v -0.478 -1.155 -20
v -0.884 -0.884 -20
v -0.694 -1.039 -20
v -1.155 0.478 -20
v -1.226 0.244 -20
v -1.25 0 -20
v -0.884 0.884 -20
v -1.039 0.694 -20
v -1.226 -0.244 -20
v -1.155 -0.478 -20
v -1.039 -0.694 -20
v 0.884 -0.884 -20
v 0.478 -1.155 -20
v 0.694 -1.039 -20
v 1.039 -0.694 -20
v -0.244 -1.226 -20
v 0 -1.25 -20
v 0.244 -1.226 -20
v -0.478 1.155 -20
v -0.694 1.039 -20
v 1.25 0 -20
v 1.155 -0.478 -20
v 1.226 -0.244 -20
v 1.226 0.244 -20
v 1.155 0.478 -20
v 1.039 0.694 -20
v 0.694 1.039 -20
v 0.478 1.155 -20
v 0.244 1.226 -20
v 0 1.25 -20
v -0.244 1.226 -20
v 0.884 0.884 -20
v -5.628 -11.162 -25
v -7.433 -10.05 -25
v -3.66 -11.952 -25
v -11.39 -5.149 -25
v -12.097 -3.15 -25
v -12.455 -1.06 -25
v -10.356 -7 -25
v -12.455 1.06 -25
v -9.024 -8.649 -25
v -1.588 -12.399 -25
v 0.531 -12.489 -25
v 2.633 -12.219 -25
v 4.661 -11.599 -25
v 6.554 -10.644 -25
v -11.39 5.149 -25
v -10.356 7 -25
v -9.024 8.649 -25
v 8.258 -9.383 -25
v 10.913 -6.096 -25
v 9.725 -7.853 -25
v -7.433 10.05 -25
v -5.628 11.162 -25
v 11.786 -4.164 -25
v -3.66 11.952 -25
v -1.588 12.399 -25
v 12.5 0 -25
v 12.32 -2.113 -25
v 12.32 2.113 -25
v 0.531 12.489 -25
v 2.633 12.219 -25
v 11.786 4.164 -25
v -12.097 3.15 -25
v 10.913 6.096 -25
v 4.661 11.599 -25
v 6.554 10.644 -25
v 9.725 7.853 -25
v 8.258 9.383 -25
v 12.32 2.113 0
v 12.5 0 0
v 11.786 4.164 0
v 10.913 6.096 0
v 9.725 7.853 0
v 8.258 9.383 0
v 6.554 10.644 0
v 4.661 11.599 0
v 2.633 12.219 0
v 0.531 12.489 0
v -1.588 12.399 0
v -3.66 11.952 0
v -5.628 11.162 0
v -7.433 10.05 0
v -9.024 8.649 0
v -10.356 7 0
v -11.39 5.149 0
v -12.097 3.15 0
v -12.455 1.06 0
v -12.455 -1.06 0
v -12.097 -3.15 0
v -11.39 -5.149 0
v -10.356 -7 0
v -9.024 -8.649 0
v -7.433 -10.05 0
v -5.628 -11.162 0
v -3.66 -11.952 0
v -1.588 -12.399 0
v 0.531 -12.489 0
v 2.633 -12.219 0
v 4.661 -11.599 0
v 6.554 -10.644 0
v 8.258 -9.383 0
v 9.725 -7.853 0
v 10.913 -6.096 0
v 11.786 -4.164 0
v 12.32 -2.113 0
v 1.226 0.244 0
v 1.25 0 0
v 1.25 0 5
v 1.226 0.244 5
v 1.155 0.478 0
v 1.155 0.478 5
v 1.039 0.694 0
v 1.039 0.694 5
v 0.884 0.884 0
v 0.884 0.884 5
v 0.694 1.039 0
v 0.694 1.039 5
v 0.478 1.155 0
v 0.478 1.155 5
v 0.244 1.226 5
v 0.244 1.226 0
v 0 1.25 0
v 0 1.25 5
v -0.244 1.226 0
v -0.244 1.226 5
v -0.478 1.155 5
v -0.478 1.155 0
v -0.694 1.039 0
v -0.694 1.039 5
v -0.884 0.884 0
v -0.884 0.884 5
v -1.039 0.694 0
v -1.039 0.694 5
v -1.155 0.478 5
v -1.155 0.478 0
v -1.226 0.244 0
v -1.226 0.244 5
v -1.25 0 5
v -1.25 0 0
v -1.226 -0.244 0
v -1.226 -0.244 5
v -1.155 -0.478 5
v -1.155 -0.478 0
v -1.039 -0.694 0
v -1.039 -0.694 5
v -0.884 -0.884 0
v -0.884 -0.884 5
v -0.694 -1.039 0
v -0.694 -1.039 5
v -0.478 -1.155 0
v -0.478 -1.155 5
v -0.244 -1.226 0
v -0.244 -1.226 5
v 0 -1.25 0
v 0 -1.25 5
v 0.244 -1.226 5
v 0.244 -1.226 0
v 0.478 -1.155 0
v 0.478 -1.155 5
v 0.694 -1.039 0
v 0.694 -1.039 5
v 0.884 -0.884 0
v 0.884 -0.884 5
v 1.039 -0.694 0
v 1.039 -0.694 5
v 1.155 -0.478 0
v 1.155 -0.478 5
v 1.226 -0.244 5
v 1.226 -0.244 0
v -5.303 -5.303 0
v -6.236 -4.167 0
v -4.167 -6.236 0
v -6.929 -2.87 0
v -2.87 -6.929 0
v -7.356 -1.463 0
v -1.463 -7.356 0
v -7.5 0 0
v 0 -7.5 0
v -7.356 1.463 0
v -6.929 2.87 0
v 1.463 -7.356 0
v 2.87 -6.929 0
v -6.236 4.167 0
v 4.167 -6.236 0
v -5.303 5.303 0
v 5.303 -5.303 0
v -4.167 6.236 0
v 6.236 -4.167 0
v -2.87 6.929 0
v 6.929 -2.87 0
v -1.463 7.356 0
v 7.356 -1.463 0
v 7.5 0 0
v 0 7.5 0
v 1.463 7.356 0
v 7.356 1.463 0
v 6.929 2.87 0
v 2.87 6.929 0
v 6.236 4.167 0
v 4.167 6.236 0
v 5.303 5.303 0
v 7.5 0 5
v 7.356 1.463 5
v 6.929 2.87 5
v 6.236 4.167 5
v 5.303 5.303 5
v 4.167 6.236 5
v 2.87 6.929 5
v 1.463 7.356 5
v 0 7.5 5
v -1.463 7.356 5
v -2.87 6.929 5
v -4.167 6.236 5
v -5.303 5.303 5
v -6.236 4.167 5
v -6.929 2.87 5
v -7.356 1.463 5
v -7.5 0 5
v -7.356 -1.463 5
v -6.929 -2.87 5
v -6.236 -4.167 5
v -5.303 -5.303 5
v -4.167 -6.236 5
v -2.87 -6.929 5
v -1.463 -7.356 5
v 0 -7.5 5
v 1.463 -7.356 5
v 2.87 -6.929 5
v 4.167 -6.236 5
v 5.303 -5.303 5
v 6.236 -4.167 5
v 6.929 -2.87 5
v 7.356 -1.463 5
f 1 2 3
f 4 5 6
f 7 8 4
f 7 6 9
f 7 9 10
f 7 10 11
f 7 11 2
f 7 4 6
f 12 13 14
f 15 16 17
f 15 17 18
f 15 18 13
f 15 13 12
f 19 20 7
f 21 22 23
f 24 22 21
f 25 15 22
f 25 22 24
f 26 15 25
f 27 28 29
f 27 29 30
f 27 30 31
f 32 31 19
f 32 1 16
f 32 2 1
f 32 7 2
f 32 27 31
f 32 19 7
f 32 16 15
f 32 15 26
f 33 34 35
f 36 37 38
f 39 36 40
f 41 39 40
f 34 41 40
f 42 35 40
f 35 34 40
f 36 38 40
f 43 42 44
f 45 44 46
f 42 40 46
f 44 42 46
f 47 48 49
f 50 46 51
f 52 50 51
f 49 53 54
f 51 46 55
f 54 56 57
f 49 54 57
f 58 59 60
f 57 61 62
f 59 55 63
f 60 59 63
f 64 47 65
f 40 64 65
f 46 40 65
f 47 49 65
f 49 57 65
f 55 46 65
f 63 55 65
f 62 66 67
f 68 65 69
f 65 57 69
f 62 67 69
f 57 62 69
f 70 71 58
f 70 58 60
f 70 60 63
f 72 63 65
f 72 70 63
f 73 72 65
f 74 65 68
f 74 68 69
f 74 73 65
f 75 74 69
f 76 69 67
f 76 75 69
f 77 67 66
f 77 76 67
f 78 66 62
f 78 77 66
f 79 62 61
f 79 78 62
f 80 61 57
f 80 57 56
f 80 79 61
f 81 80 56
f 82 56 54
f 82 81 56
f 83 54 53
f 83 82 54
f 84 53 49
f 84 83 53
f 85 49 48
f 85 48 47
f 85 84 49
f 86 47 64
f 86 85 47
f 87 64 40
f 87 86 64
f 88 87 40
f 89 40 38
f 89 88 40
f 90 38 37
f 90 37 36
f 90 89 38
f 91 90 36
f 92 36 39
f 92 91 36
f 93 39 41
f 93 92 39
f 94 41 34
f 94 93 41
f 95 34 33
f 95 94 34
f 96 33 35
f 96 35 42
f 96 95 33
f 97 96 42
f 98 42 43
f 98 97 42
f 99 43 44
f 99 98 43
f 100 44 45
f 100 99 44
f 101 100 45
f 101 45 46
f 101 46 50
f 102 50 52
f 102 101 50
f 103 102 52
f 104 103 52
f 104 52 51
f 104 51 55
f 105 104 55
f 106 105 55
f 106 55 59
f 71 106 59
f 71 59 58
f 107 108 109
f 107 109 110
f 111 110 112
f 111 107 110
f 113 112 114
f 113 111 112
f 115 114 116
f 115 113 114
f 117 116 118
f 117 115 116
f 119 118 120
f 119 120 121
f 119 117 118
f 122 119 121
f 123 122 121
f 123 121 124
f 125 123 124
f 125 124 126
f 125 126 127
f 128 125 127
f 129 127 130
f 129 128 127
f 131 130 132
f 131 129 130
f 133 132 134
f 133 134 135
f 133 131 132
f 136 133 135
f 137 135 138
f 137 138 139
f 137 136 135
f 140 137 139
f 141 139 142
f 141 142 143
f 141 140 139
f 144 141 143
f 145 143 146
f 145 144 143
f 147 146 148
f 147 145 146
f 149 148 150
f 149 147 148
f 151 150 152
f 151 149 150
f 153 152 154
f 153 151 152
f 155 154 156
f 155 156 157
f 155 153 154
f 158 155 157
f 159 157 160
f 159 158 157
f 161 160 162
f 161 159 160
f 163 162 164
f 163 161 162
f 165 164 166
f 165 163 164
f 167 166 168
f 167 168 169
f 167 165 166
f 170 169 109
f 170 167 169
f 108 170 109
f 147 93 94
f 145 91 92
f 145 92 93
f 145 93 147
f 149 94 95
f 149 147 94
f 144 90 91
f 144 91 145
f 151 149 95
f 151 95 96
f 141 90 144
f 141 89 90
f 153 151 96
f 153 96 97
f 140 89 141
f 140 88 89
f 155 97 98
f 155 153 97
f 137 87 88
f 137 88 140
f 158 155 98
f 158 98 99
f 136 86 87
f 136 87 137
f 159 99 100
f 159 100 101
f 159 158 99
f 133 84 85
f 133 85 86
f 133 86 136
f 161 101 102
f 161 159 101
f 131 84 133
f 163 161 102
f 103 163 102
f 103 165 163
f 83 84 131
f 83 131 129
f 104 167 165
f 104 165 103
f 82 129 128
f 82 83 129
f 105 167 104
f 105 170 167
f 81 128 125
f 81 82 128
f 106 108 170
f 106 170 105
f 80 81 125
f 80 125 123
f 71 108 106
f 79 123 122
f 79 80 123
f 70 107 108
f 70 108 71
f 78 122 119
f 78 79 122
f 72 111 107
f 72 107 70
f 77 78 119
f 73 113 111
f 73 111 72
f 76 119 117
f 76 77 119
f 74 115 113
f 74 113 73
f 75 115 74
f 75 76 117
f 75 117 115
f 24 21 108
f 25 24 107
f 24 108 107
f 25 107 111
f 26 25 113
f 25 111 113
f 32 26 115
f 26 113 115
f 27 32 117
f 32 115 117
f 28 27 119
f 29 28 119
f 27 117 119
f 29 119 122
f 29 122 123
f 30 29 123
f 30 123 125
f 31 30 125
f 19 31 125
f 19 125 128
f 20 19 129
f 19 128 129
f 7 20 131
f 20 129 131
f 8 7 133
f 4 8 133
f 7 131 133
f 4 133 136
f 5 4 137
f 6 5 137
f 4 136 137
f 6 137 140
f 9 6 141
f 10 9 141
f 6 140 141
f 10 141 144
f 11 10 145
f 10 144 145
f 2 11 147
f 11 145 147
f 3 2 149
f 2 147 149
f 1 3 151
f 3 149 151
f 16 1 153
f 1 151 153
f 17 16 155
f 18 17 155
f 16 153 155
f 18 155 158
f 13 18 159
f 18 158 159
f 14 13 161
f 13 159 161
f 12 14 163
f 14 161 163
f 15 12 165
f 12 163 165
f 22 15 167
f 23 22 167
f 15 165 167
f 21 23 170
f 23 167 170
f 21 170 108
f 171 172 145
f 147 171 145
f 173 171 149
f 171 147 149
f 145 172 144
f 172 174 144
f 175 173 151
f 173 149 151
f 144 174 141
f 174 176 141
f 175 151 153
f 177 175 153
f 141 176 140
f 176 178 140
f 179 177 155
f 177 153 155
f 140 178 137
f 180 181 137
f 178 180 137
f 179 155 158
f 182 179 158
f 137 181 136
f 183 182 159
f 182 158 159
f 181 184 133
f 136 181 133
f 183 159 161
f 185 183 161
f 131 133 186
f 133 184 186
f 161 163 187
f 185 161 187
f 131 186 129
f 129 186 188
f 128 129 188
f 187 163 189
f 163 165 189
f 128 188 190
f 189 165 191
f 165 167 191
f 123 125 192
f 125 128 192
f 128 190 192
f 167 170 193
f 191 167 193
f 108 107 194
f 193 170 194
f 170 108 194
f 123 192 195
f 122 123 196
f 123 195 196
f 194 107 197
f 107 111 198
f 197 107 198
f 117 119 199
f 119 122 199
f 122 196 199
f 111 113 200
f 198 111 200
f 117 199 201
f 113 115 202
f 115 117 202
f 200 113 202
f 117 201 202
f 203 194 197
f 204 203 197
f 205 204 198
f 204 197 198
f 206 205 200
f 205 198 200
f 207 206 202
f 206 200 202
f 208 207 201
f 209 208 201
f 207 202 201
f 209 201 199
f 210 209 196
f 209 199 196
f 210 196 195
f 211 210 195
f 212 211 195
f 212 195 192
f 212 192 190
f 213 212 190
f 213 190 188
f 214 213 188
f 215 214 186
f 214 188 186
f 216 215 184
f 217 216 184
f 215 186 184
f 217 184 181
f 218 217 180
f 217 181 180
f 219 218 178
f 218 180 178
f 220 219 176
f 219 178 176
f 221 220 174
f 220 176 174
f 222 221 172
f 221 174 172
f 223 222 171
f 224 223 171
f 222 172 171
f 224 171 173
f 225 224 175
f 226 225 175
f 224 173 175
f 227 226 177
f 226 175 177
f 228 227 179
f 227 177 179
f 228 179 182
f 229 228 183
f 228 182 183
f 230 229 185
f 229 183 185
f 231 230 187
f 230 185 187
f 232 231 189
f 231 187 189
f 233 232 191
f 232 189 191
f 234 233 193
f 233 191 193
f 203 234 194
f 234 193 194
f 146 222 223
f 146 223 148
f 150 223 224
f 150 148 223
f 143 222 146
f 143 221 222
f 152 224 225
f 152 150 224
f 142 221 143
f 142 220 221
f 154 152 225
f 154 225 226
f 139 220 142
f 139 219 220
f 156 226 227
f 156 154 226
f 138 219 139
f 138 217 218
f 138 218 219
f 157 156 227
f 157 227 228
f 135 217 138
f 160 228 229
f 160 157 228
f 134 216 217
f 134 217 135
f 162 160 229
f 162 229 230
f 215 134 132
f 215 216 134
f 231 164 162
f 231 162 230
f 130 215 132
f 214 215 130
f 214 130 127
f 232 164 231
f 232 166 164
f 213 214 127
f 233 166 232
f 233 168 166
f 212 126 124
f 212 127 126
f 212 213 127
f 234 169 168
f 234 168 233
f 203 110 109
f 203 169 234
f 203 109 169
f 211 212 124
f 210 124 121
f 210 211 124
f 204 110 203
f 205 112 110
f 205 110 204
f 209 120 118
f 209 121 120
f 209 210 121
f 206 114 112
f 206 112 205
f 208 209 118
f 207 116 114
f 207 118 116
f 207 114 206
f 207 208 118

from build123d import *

# Parameters (mm, degrees)
F0_R     = 12.5
F0_R_2   = 7.5
F0_R_3   = 1.25
F1_DEPTH = 25
F2_DEPTH = 20
F3_DEPTH = 5


with BuildPart() as f1:
    # F0 (on Top) → F1 (new body)
    with BuildSketch(Plane.XY):
        Circle(F0_R)
        Circle(F0_R_2, mode=Mode.SUBTRACT)
        Circle(F0_R_2)
        Circle(F0_R_3, mode=Mode.SUBTRACT)
        Circle(F0_R_3)
    extrude(amount=-F1_DEPTH)

    # F0 (on Top) → F2 (cut)
    with BuildSketch(Plane.XY):
        Circle(F0_R_3)
    extrude(amount=-F2_DEPTH, mode=Mode.SUBTRACT)


with BuildPart() as f3:
    # F0 (on Top) → F3 (new body)
    with BuildSketch(Plane.XY):
        Circle(F0_R_2)
        Circle(F0_R_3, mode=Mode.SUBTRACT)
    extrude(amount=F3_DEPTH)


solid = Compound([f1.part, f3.part])
